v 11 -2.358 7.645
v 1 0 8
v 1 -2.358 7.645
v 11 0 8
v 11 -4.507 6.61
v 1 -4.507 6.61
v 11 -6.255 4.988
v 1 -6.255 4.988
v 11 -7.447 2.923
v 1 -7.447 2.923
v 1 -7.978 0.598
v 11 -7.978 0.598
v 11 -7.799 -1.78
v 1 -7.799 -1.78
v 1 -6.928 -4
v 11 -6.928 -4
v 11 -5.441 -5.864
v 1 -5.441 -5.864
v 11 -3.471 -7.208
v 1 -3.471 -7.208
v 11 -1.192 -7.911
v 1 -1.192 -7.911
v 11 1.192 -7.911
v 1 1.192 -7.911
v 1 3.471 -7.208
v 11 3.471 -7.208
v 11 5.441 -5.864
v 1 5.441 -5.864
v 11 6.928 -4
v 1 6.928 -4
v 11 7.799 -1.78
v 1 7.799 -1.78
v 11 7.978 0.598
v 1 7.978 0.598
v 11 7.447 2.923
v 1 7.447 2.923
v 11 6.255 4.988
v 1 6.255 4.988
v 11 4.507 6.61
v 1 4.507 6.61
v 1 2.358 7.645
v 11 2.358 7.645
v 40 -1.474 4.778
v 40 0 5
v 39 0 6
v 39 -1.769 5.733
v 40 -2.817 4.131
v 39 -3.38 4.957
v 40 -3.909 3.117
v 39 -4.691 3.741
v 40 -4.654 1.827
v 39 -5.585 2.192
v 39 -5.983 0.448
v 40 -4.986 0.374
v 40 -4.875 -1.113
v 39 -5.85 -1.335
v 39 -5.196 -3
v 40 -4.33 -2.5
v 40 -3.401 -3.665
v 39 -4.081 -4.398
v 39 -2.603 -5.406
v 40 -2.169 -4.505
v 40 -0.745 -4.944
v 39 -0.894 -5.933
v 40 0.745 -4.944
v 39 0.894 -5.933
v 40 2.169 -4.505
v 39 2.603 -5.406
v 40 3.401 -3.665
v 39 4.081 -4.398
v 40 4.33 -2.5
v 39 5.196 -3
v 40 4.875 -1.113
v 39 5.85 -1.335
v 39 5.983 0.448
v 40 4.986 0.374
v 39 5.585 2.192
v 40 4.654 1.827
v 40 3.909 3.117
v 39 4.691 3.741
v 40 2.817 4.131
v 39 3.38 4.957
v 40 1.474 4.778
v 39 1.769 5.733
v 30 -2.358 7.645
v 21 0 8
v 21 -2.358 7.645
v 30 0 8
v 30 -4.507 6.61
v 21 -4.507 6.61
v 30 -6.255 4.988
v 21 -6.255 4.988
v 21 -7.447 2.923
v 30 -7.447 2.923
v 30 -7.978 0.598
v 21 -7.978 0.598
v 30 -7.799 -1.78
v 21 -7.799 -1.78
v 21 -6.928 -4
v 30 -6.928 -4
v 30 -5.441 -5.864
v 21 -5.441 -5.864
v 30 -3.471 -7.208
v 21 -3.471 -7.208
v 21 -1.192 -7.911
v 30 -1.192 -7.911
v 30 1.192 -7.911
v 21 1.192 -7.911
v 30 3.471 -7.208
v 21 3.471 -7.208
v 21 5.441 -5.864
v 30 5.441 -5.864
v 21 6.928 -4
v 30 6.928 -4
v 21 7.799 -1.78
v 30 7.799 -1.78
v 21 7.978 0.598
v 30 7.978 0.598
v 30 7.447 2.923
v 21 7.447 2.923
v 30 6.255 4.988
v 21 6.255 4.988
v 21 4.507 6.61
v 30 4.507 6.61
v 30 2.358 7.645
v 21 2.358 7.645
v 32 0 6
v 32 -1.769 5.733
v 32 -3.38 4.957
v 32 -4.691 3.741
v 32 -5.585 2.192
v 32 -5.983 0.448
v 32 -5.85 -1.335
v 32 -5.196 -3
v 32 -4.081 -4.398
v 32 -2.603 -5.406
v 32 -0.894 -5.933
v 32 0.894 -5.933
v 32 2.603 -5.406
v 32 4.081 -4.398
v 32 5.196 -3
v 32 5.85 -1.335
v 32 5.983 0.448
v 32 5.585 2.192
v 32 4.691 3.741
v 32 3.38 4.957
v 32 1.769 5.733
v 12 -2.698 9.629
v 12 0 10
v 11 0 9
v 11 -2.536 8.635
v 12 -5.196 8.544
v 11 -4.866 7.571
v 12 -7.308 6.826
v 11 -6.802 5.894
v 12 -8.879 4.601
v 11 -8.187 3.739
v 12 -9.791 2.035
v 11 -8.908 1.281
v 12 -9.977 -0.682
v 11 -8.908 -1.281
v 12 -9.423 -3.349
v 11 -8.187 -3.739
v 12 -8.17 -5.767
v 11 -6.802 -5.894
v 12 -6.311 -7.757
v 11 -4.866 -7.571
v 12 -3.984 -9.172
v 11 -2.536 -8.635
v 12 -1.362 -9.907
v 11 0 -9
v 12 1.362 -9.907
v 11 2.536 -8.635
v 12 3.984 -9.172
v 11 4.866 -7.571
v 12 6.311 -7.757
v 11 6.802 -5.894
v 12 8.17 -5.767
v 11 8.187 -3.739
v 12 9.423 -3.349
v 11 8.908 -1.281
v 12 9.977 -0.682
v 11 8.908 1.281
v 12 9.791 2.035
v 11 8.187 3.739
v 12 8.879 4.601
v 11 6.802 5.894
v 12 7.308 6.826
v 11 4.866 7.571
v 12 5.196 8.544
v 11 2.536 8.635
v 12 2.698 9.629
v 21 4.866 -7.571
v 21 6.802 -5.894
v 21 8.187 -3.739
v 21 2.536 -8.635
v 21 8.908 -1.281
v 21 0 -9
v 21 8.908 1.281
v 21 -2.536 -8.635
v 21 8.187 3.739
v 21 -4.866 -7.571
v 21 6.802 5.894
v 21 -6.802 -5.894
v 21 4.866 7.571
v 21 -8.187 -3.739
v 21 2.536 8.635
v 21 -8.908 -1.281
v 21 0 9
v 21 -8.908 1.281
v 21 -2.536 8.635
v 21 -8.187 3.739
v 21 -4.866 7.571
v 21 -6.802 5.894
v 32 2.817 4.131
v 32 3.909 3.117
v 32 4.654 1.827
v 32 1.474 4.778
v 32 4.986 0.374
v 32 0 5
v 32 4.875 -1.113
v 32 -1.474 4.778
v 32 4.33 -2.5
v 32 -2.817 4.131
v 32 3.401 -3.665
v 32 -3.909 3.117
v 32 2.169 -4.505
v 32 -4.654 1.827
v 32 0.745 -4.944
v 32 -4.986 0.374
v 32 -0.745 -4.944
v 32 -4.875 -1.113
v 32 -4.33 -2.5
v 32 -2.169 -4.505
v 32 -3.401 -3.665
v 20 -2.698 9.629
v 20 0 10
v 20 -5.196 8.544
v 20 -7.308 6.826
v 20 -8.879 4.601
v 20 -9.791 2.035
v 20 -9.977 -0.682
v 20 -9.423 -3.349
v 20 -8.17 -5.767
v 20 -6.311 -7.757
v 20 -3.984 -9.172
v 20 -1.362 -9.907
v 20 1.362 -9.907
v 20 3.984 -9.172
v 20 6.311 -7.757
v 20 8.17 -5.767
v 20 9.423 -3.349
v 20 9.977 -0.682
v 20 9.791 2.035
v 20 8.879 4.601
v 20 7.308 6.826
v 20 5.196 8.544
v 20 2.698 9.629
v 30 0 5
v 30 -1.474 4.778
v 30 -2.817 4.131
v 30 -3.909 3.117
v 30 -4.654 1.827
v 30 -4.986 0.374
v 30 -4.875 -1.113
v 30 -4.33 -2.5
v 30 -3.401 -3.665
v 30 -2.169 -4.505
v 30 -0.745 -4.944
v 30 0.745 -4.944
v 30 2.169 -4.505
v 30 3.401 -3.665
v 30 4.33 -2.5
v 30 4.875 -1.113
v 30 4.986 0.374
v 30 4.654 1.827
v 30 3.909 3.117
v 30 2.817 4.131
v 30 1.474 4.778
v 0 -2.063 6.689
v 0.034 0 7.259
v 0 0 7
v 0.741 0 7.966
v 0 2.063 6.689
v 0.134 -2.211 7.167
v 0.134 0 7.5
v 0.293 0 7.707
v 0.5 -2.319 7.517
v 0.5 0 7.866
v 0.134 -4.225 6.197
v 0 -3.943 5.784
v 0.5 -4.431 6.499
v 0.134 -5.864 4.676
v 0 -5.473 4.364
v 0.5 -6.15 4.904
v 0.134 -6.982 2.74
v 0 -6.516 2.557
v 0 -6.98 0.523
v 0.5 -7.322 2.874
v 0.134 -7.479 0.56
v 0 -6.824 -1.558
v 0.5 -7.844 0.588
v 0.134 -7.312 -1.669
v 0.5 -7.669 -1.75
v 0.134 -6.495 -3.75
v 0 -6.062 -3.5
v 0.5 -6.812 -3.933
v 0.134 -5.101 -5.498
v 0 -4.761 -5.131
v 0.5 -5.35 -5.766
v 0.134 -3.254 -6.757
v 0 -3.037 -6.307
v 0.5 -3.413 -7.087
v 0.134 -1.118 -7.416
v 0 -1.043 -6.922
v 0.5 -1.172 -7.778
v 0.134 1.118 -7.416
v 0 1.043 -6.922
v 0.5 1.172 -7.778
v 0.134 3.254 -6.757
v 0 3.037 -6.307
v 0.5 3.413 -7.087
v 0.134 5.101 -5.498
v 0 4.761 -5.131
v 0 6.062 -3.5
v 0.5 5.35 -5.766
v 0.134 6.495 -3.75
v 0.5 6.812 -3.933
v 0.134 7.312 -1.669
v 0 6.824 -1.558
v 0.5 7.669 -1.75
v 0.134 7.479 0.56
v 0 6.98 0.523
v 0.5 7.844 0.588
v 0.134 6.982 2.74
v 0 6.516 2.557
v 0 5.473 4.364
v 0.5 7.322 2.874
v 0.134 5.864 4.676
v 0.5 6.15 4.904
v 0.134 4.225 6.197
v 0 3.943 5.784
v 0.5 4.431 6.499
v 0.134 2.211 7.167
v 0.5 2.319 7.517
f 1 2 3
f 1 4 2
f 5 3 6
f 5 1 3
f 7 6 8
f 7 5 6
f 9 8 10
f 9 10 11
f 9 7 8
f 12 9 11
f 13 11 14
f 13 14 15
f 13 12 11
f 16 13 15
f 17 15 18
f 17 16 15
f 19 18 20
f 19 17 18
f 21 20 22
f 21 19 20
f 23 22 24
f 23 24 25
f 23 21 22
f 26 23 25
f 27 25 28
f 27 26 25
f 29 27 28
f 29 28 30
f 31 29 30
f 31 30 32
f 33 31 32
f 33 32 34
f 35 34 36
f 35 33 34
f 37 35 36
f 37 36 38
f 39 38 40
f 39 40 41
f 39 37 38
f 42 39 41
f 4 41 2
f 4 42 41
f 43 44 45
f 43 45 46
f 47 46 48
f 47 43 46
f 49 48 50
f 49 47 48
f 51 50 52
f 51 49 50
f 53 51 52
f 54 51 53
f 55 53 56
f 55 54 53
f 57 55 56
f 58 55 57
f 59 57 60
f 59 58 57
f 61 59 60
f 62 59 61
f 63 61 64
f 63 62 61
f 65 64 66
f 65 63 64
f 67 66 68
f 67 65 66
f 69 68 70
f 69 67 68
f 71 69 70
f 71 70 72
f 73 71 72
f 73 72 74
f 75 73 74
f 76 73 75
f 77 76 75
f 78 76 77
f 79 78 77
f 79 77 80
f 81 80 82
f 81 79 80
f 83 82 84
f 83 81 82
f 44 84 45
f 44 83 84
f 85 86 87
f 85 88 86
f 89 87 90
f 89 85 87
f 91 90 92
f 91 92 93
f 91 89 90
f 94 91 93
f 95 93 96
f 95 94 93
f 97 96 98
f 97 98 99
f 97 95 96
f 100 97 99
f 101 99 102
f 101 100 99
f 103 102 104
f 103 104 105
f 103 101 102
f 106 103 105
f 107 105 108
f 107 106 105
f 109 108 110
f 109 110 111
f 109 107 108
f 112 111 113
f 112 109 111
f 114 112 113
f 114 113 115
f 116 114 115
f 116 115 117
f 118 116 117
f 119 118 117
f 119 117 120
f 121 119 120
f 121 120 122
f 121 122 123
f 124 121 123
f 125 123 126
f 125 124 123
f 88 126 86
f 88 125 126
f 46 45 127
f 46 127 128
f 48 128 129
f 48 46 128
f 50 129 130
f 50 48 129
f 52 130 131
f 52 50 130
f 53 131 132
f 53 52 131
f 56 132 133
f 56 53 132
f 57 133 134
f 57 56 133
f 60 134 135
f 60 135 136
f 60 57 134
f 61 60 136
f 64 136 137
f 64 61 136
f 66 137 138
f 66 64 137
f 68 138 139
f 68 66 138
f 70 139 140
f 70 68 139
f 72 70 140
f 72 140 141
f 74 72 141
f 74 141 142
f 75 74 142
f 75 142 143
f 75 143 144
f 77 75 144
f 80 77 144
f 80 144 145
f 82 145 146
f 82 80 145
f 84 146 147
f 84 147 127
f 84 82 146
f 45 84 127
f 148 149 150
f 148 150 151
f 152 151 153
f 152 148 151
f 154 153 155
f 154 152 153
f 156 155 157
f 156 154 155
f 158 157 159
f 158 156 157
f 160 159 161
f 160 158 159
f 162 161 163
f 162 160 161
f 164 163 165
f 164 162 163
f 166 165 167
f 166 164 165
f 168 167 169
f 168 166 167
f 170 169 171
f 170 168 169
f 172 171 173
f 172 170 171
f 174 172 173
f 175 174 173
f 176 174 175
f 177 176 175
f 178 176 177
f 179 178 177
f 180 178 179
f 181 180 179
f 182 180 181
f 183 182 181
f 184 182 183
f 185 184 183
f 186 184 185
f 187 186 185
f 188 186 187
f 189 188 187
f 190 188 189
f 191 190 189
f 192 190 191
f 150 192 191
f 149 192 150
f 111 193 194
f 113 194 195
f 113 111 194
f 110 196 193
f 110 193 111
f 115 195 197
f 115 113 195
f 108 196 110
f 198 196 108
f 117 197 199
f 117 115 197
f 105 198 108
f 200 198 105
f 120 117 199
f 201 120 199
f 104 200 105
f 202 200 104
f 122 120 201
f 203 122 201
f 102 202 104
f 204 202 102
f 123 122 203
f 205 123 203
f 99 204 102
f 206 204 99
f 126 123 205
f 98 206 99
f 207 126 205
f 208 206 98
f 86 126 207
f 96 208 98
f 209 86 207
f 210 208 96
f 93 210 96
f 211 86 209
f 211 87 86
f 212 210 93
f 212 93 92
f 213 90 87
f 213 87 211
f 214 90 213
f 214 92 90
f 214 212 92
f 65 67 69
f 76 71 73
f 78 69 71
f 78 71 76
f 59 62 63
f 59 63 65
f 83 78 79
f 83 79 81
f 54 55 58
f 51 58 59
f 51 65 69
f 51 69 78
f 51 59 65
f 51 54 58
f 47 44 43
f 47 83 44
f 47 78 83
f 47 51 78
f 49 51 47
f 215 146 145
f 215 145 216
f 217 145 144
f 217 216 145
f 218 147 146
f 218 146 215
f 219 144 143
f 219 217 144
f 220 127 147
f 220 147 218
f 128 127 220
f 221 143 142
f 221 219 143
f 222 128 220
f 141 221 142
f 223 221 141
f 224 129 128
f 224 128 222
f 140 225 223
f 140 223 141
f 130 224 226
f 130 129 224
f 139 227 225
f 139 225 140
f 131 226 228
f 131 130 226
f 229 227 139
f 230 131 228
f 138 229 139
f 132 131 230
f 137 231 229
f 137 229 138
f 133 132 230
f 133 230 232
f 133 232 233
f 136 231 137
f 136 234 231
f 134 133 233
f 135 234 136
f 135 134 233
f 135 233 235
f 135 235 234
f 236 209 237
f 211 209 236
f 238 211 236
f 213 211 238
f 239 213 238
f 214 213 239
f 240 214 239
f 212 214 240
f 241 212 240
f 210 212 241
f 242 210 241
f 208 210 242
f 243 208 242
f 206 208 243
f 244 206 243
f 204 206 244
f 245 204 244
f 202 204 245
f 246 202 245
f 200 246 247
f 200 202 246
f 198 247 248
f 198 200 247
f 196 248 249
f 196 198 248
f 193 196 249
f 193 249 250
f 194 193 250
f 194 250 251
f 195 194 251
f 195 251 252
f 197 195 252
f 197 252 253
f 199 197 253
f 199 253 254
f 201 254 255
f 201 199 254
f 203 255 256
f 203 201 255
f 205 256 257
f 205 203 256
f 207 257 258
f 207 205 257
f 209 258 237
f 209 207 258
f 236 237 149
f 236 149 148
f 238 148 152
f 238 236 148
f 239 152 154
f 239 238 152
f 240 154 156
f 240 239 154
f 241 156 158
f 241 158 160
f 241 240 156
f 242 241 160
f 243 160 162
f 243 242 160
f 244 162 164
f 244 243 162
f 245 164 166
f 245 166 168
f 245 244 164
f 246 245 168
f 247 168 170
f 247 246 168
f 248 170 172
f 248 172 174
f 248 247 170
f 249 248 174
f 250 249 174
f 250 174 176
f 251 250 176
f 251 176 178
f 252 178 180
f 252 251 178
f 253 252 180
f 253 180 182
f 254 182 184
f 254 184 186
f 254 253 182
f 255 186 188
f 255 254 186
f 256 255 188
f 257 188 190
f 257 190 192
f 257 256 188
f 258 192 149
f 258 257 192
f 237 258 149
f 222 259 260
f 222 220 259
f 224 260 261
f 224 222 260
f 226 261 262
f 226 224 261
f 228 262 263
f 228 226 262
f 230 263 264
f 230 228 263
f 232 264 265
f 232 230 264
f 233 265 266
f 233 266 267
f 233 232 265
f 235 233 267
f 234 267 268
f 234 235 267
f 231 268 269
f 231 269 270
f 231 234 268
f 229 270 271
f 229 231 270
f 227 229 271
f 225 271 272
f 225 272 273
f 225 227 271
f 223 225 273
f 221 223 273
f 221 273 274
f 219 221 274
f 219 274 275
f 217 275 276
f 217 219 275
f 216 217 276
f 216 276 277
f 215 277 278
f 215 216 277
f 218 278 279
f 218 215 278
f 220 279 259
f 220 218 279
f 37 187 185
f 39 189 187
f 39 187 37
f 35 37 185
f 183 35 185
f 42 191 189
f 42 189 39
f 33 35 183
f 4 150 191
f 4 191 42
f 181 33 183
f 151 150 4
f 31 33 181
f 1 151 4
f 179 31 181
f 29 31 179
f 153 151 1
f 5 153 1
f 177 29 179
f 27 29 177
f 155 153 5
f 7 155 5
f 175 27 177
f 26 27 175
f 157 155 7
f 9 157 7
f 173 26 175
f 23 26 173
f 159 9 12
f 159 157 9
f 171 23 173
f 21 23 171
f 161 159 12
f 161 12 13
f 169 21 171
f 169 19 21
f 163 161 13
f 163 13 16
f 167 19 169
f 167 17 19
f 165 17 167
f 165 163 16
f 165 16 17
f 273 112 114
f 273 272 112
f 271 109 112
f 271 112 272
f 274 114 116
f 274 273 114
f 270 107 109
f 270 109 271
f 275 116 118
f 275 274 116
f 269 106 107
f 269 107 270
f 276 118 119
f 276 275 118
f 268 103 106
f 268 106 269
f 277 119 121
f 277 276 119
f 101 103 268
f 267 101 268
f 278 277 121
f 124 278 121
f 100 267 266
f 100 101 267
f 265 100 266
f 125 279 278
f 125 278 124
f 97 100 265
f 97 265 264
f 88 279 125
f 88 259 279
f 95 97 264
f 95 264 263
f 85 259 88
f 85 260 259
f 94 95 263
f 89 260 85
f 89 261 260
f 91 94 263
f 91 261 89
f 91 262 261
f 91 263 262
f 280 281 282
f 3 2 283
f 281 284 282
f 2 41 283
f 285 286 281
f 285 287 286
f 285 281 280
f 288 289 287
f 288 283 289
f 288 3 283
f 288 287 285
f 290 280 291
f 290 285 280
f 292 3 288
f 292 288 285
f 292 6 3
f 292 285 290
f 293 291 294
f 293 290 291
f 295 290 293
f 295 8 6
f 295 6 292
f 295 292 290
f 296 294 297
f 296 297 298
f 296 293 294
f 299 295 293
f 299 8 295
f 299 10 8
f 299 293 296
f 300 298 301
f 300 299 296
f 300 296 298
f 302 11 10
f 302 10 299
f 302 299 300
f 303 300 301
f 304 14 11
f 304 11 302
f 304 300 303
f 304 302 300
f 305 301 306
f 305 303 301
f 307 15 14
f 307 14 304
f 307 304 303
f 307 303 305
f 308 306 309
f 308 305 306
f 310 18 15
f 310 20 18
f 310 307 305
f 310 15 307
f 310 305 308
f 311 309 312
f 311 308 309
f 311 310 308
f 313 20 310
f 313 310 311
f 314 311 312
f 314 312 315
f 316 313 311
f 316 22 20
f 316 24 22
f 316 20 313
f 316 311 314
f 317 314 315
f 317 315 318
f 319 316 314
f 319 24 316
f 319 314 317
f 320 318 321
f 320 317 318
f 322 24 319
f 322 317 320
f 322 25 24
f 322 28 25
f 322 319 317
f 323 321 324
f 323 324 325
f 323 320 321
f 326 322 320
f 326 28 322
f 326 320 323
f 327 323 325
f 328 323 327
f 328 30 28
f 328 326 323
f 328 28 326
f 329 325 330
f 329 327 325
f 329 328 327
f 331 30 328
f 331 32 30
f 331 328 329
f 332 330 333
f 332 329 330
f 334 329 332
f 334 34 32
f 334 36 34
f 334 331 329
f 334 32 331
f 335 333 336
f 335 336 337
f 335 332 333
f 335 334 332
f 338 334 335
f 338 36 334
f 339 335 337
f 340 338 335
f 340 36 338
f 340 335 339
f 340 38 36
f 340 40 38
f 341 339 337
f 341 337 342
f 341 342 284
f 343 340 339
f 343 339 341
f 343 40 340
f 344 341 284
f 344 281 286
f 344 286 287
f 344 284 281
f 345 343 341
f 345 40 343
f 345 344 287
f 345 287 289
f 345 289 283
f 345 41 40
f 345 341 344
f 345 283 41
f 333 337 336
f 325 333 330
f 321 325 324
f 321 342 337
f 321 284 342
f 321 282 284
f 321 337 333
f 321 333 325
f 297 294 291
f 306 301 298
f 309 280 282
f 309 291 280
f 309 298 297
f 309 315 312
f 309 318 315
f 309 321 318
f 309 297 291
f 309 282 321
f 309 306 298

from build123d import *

# Parameters (mm, degrees)
CHAMFER_1_SIZE = 1
CHAMFER_2_SIZE = 1


with BuildPart() as part:
    # 草图1 → 旋转1 (revolve)
    with BuildSketch(Plane.XY, mode=Mode.PRIVATE) as revolve_1_sk:
        with BuildLine():
            Line((0, 0), (0, 7))
            ThreePointArc((0, 7), (0.292893219, 7.707106781), (1, 8))
            Line((1, 8), (11, 8))
            Line((11, 8), (11, 10))
            Line((11, 10), (21, 10))
            Line((21, 10), (21, 8))
            Line((21, 8), (30, 8))
            Line((30, 8), (30, 5))
            Line((30, 5), (32, 5))
            Line((32, 5), (32, 6))
            Line((32, 6), (40, 6))
            Line((40, 6), (40, 0))
            Line((40, 0), (0, 0))
        make_face()
    revolve(revolve_1_sk.sketch.rotate(Axis((0, 0, 0), (1, 0, 0)), 90), axis=Axis((0, 0, 0), (1, 0, 0)))

    # 倒角1
    chamfer_1_edges = [part.edges().sort_by_distance(p)[0] for p in [
        (11, 0, -10),
        (21, 0, -10),
    ]]
    chamfer(chamfer_1_edges, length=CHAMFER_1_SIZE)

    # 倒角2
    chamfer_2_edges = [part.edges().sort_by_distance(p)[0] for p in [
        (40, 0, -6),
    ]]
    chamfer(chamfer_2_edges, length=CHAMFER_2_SIZE)


solid = part.part
